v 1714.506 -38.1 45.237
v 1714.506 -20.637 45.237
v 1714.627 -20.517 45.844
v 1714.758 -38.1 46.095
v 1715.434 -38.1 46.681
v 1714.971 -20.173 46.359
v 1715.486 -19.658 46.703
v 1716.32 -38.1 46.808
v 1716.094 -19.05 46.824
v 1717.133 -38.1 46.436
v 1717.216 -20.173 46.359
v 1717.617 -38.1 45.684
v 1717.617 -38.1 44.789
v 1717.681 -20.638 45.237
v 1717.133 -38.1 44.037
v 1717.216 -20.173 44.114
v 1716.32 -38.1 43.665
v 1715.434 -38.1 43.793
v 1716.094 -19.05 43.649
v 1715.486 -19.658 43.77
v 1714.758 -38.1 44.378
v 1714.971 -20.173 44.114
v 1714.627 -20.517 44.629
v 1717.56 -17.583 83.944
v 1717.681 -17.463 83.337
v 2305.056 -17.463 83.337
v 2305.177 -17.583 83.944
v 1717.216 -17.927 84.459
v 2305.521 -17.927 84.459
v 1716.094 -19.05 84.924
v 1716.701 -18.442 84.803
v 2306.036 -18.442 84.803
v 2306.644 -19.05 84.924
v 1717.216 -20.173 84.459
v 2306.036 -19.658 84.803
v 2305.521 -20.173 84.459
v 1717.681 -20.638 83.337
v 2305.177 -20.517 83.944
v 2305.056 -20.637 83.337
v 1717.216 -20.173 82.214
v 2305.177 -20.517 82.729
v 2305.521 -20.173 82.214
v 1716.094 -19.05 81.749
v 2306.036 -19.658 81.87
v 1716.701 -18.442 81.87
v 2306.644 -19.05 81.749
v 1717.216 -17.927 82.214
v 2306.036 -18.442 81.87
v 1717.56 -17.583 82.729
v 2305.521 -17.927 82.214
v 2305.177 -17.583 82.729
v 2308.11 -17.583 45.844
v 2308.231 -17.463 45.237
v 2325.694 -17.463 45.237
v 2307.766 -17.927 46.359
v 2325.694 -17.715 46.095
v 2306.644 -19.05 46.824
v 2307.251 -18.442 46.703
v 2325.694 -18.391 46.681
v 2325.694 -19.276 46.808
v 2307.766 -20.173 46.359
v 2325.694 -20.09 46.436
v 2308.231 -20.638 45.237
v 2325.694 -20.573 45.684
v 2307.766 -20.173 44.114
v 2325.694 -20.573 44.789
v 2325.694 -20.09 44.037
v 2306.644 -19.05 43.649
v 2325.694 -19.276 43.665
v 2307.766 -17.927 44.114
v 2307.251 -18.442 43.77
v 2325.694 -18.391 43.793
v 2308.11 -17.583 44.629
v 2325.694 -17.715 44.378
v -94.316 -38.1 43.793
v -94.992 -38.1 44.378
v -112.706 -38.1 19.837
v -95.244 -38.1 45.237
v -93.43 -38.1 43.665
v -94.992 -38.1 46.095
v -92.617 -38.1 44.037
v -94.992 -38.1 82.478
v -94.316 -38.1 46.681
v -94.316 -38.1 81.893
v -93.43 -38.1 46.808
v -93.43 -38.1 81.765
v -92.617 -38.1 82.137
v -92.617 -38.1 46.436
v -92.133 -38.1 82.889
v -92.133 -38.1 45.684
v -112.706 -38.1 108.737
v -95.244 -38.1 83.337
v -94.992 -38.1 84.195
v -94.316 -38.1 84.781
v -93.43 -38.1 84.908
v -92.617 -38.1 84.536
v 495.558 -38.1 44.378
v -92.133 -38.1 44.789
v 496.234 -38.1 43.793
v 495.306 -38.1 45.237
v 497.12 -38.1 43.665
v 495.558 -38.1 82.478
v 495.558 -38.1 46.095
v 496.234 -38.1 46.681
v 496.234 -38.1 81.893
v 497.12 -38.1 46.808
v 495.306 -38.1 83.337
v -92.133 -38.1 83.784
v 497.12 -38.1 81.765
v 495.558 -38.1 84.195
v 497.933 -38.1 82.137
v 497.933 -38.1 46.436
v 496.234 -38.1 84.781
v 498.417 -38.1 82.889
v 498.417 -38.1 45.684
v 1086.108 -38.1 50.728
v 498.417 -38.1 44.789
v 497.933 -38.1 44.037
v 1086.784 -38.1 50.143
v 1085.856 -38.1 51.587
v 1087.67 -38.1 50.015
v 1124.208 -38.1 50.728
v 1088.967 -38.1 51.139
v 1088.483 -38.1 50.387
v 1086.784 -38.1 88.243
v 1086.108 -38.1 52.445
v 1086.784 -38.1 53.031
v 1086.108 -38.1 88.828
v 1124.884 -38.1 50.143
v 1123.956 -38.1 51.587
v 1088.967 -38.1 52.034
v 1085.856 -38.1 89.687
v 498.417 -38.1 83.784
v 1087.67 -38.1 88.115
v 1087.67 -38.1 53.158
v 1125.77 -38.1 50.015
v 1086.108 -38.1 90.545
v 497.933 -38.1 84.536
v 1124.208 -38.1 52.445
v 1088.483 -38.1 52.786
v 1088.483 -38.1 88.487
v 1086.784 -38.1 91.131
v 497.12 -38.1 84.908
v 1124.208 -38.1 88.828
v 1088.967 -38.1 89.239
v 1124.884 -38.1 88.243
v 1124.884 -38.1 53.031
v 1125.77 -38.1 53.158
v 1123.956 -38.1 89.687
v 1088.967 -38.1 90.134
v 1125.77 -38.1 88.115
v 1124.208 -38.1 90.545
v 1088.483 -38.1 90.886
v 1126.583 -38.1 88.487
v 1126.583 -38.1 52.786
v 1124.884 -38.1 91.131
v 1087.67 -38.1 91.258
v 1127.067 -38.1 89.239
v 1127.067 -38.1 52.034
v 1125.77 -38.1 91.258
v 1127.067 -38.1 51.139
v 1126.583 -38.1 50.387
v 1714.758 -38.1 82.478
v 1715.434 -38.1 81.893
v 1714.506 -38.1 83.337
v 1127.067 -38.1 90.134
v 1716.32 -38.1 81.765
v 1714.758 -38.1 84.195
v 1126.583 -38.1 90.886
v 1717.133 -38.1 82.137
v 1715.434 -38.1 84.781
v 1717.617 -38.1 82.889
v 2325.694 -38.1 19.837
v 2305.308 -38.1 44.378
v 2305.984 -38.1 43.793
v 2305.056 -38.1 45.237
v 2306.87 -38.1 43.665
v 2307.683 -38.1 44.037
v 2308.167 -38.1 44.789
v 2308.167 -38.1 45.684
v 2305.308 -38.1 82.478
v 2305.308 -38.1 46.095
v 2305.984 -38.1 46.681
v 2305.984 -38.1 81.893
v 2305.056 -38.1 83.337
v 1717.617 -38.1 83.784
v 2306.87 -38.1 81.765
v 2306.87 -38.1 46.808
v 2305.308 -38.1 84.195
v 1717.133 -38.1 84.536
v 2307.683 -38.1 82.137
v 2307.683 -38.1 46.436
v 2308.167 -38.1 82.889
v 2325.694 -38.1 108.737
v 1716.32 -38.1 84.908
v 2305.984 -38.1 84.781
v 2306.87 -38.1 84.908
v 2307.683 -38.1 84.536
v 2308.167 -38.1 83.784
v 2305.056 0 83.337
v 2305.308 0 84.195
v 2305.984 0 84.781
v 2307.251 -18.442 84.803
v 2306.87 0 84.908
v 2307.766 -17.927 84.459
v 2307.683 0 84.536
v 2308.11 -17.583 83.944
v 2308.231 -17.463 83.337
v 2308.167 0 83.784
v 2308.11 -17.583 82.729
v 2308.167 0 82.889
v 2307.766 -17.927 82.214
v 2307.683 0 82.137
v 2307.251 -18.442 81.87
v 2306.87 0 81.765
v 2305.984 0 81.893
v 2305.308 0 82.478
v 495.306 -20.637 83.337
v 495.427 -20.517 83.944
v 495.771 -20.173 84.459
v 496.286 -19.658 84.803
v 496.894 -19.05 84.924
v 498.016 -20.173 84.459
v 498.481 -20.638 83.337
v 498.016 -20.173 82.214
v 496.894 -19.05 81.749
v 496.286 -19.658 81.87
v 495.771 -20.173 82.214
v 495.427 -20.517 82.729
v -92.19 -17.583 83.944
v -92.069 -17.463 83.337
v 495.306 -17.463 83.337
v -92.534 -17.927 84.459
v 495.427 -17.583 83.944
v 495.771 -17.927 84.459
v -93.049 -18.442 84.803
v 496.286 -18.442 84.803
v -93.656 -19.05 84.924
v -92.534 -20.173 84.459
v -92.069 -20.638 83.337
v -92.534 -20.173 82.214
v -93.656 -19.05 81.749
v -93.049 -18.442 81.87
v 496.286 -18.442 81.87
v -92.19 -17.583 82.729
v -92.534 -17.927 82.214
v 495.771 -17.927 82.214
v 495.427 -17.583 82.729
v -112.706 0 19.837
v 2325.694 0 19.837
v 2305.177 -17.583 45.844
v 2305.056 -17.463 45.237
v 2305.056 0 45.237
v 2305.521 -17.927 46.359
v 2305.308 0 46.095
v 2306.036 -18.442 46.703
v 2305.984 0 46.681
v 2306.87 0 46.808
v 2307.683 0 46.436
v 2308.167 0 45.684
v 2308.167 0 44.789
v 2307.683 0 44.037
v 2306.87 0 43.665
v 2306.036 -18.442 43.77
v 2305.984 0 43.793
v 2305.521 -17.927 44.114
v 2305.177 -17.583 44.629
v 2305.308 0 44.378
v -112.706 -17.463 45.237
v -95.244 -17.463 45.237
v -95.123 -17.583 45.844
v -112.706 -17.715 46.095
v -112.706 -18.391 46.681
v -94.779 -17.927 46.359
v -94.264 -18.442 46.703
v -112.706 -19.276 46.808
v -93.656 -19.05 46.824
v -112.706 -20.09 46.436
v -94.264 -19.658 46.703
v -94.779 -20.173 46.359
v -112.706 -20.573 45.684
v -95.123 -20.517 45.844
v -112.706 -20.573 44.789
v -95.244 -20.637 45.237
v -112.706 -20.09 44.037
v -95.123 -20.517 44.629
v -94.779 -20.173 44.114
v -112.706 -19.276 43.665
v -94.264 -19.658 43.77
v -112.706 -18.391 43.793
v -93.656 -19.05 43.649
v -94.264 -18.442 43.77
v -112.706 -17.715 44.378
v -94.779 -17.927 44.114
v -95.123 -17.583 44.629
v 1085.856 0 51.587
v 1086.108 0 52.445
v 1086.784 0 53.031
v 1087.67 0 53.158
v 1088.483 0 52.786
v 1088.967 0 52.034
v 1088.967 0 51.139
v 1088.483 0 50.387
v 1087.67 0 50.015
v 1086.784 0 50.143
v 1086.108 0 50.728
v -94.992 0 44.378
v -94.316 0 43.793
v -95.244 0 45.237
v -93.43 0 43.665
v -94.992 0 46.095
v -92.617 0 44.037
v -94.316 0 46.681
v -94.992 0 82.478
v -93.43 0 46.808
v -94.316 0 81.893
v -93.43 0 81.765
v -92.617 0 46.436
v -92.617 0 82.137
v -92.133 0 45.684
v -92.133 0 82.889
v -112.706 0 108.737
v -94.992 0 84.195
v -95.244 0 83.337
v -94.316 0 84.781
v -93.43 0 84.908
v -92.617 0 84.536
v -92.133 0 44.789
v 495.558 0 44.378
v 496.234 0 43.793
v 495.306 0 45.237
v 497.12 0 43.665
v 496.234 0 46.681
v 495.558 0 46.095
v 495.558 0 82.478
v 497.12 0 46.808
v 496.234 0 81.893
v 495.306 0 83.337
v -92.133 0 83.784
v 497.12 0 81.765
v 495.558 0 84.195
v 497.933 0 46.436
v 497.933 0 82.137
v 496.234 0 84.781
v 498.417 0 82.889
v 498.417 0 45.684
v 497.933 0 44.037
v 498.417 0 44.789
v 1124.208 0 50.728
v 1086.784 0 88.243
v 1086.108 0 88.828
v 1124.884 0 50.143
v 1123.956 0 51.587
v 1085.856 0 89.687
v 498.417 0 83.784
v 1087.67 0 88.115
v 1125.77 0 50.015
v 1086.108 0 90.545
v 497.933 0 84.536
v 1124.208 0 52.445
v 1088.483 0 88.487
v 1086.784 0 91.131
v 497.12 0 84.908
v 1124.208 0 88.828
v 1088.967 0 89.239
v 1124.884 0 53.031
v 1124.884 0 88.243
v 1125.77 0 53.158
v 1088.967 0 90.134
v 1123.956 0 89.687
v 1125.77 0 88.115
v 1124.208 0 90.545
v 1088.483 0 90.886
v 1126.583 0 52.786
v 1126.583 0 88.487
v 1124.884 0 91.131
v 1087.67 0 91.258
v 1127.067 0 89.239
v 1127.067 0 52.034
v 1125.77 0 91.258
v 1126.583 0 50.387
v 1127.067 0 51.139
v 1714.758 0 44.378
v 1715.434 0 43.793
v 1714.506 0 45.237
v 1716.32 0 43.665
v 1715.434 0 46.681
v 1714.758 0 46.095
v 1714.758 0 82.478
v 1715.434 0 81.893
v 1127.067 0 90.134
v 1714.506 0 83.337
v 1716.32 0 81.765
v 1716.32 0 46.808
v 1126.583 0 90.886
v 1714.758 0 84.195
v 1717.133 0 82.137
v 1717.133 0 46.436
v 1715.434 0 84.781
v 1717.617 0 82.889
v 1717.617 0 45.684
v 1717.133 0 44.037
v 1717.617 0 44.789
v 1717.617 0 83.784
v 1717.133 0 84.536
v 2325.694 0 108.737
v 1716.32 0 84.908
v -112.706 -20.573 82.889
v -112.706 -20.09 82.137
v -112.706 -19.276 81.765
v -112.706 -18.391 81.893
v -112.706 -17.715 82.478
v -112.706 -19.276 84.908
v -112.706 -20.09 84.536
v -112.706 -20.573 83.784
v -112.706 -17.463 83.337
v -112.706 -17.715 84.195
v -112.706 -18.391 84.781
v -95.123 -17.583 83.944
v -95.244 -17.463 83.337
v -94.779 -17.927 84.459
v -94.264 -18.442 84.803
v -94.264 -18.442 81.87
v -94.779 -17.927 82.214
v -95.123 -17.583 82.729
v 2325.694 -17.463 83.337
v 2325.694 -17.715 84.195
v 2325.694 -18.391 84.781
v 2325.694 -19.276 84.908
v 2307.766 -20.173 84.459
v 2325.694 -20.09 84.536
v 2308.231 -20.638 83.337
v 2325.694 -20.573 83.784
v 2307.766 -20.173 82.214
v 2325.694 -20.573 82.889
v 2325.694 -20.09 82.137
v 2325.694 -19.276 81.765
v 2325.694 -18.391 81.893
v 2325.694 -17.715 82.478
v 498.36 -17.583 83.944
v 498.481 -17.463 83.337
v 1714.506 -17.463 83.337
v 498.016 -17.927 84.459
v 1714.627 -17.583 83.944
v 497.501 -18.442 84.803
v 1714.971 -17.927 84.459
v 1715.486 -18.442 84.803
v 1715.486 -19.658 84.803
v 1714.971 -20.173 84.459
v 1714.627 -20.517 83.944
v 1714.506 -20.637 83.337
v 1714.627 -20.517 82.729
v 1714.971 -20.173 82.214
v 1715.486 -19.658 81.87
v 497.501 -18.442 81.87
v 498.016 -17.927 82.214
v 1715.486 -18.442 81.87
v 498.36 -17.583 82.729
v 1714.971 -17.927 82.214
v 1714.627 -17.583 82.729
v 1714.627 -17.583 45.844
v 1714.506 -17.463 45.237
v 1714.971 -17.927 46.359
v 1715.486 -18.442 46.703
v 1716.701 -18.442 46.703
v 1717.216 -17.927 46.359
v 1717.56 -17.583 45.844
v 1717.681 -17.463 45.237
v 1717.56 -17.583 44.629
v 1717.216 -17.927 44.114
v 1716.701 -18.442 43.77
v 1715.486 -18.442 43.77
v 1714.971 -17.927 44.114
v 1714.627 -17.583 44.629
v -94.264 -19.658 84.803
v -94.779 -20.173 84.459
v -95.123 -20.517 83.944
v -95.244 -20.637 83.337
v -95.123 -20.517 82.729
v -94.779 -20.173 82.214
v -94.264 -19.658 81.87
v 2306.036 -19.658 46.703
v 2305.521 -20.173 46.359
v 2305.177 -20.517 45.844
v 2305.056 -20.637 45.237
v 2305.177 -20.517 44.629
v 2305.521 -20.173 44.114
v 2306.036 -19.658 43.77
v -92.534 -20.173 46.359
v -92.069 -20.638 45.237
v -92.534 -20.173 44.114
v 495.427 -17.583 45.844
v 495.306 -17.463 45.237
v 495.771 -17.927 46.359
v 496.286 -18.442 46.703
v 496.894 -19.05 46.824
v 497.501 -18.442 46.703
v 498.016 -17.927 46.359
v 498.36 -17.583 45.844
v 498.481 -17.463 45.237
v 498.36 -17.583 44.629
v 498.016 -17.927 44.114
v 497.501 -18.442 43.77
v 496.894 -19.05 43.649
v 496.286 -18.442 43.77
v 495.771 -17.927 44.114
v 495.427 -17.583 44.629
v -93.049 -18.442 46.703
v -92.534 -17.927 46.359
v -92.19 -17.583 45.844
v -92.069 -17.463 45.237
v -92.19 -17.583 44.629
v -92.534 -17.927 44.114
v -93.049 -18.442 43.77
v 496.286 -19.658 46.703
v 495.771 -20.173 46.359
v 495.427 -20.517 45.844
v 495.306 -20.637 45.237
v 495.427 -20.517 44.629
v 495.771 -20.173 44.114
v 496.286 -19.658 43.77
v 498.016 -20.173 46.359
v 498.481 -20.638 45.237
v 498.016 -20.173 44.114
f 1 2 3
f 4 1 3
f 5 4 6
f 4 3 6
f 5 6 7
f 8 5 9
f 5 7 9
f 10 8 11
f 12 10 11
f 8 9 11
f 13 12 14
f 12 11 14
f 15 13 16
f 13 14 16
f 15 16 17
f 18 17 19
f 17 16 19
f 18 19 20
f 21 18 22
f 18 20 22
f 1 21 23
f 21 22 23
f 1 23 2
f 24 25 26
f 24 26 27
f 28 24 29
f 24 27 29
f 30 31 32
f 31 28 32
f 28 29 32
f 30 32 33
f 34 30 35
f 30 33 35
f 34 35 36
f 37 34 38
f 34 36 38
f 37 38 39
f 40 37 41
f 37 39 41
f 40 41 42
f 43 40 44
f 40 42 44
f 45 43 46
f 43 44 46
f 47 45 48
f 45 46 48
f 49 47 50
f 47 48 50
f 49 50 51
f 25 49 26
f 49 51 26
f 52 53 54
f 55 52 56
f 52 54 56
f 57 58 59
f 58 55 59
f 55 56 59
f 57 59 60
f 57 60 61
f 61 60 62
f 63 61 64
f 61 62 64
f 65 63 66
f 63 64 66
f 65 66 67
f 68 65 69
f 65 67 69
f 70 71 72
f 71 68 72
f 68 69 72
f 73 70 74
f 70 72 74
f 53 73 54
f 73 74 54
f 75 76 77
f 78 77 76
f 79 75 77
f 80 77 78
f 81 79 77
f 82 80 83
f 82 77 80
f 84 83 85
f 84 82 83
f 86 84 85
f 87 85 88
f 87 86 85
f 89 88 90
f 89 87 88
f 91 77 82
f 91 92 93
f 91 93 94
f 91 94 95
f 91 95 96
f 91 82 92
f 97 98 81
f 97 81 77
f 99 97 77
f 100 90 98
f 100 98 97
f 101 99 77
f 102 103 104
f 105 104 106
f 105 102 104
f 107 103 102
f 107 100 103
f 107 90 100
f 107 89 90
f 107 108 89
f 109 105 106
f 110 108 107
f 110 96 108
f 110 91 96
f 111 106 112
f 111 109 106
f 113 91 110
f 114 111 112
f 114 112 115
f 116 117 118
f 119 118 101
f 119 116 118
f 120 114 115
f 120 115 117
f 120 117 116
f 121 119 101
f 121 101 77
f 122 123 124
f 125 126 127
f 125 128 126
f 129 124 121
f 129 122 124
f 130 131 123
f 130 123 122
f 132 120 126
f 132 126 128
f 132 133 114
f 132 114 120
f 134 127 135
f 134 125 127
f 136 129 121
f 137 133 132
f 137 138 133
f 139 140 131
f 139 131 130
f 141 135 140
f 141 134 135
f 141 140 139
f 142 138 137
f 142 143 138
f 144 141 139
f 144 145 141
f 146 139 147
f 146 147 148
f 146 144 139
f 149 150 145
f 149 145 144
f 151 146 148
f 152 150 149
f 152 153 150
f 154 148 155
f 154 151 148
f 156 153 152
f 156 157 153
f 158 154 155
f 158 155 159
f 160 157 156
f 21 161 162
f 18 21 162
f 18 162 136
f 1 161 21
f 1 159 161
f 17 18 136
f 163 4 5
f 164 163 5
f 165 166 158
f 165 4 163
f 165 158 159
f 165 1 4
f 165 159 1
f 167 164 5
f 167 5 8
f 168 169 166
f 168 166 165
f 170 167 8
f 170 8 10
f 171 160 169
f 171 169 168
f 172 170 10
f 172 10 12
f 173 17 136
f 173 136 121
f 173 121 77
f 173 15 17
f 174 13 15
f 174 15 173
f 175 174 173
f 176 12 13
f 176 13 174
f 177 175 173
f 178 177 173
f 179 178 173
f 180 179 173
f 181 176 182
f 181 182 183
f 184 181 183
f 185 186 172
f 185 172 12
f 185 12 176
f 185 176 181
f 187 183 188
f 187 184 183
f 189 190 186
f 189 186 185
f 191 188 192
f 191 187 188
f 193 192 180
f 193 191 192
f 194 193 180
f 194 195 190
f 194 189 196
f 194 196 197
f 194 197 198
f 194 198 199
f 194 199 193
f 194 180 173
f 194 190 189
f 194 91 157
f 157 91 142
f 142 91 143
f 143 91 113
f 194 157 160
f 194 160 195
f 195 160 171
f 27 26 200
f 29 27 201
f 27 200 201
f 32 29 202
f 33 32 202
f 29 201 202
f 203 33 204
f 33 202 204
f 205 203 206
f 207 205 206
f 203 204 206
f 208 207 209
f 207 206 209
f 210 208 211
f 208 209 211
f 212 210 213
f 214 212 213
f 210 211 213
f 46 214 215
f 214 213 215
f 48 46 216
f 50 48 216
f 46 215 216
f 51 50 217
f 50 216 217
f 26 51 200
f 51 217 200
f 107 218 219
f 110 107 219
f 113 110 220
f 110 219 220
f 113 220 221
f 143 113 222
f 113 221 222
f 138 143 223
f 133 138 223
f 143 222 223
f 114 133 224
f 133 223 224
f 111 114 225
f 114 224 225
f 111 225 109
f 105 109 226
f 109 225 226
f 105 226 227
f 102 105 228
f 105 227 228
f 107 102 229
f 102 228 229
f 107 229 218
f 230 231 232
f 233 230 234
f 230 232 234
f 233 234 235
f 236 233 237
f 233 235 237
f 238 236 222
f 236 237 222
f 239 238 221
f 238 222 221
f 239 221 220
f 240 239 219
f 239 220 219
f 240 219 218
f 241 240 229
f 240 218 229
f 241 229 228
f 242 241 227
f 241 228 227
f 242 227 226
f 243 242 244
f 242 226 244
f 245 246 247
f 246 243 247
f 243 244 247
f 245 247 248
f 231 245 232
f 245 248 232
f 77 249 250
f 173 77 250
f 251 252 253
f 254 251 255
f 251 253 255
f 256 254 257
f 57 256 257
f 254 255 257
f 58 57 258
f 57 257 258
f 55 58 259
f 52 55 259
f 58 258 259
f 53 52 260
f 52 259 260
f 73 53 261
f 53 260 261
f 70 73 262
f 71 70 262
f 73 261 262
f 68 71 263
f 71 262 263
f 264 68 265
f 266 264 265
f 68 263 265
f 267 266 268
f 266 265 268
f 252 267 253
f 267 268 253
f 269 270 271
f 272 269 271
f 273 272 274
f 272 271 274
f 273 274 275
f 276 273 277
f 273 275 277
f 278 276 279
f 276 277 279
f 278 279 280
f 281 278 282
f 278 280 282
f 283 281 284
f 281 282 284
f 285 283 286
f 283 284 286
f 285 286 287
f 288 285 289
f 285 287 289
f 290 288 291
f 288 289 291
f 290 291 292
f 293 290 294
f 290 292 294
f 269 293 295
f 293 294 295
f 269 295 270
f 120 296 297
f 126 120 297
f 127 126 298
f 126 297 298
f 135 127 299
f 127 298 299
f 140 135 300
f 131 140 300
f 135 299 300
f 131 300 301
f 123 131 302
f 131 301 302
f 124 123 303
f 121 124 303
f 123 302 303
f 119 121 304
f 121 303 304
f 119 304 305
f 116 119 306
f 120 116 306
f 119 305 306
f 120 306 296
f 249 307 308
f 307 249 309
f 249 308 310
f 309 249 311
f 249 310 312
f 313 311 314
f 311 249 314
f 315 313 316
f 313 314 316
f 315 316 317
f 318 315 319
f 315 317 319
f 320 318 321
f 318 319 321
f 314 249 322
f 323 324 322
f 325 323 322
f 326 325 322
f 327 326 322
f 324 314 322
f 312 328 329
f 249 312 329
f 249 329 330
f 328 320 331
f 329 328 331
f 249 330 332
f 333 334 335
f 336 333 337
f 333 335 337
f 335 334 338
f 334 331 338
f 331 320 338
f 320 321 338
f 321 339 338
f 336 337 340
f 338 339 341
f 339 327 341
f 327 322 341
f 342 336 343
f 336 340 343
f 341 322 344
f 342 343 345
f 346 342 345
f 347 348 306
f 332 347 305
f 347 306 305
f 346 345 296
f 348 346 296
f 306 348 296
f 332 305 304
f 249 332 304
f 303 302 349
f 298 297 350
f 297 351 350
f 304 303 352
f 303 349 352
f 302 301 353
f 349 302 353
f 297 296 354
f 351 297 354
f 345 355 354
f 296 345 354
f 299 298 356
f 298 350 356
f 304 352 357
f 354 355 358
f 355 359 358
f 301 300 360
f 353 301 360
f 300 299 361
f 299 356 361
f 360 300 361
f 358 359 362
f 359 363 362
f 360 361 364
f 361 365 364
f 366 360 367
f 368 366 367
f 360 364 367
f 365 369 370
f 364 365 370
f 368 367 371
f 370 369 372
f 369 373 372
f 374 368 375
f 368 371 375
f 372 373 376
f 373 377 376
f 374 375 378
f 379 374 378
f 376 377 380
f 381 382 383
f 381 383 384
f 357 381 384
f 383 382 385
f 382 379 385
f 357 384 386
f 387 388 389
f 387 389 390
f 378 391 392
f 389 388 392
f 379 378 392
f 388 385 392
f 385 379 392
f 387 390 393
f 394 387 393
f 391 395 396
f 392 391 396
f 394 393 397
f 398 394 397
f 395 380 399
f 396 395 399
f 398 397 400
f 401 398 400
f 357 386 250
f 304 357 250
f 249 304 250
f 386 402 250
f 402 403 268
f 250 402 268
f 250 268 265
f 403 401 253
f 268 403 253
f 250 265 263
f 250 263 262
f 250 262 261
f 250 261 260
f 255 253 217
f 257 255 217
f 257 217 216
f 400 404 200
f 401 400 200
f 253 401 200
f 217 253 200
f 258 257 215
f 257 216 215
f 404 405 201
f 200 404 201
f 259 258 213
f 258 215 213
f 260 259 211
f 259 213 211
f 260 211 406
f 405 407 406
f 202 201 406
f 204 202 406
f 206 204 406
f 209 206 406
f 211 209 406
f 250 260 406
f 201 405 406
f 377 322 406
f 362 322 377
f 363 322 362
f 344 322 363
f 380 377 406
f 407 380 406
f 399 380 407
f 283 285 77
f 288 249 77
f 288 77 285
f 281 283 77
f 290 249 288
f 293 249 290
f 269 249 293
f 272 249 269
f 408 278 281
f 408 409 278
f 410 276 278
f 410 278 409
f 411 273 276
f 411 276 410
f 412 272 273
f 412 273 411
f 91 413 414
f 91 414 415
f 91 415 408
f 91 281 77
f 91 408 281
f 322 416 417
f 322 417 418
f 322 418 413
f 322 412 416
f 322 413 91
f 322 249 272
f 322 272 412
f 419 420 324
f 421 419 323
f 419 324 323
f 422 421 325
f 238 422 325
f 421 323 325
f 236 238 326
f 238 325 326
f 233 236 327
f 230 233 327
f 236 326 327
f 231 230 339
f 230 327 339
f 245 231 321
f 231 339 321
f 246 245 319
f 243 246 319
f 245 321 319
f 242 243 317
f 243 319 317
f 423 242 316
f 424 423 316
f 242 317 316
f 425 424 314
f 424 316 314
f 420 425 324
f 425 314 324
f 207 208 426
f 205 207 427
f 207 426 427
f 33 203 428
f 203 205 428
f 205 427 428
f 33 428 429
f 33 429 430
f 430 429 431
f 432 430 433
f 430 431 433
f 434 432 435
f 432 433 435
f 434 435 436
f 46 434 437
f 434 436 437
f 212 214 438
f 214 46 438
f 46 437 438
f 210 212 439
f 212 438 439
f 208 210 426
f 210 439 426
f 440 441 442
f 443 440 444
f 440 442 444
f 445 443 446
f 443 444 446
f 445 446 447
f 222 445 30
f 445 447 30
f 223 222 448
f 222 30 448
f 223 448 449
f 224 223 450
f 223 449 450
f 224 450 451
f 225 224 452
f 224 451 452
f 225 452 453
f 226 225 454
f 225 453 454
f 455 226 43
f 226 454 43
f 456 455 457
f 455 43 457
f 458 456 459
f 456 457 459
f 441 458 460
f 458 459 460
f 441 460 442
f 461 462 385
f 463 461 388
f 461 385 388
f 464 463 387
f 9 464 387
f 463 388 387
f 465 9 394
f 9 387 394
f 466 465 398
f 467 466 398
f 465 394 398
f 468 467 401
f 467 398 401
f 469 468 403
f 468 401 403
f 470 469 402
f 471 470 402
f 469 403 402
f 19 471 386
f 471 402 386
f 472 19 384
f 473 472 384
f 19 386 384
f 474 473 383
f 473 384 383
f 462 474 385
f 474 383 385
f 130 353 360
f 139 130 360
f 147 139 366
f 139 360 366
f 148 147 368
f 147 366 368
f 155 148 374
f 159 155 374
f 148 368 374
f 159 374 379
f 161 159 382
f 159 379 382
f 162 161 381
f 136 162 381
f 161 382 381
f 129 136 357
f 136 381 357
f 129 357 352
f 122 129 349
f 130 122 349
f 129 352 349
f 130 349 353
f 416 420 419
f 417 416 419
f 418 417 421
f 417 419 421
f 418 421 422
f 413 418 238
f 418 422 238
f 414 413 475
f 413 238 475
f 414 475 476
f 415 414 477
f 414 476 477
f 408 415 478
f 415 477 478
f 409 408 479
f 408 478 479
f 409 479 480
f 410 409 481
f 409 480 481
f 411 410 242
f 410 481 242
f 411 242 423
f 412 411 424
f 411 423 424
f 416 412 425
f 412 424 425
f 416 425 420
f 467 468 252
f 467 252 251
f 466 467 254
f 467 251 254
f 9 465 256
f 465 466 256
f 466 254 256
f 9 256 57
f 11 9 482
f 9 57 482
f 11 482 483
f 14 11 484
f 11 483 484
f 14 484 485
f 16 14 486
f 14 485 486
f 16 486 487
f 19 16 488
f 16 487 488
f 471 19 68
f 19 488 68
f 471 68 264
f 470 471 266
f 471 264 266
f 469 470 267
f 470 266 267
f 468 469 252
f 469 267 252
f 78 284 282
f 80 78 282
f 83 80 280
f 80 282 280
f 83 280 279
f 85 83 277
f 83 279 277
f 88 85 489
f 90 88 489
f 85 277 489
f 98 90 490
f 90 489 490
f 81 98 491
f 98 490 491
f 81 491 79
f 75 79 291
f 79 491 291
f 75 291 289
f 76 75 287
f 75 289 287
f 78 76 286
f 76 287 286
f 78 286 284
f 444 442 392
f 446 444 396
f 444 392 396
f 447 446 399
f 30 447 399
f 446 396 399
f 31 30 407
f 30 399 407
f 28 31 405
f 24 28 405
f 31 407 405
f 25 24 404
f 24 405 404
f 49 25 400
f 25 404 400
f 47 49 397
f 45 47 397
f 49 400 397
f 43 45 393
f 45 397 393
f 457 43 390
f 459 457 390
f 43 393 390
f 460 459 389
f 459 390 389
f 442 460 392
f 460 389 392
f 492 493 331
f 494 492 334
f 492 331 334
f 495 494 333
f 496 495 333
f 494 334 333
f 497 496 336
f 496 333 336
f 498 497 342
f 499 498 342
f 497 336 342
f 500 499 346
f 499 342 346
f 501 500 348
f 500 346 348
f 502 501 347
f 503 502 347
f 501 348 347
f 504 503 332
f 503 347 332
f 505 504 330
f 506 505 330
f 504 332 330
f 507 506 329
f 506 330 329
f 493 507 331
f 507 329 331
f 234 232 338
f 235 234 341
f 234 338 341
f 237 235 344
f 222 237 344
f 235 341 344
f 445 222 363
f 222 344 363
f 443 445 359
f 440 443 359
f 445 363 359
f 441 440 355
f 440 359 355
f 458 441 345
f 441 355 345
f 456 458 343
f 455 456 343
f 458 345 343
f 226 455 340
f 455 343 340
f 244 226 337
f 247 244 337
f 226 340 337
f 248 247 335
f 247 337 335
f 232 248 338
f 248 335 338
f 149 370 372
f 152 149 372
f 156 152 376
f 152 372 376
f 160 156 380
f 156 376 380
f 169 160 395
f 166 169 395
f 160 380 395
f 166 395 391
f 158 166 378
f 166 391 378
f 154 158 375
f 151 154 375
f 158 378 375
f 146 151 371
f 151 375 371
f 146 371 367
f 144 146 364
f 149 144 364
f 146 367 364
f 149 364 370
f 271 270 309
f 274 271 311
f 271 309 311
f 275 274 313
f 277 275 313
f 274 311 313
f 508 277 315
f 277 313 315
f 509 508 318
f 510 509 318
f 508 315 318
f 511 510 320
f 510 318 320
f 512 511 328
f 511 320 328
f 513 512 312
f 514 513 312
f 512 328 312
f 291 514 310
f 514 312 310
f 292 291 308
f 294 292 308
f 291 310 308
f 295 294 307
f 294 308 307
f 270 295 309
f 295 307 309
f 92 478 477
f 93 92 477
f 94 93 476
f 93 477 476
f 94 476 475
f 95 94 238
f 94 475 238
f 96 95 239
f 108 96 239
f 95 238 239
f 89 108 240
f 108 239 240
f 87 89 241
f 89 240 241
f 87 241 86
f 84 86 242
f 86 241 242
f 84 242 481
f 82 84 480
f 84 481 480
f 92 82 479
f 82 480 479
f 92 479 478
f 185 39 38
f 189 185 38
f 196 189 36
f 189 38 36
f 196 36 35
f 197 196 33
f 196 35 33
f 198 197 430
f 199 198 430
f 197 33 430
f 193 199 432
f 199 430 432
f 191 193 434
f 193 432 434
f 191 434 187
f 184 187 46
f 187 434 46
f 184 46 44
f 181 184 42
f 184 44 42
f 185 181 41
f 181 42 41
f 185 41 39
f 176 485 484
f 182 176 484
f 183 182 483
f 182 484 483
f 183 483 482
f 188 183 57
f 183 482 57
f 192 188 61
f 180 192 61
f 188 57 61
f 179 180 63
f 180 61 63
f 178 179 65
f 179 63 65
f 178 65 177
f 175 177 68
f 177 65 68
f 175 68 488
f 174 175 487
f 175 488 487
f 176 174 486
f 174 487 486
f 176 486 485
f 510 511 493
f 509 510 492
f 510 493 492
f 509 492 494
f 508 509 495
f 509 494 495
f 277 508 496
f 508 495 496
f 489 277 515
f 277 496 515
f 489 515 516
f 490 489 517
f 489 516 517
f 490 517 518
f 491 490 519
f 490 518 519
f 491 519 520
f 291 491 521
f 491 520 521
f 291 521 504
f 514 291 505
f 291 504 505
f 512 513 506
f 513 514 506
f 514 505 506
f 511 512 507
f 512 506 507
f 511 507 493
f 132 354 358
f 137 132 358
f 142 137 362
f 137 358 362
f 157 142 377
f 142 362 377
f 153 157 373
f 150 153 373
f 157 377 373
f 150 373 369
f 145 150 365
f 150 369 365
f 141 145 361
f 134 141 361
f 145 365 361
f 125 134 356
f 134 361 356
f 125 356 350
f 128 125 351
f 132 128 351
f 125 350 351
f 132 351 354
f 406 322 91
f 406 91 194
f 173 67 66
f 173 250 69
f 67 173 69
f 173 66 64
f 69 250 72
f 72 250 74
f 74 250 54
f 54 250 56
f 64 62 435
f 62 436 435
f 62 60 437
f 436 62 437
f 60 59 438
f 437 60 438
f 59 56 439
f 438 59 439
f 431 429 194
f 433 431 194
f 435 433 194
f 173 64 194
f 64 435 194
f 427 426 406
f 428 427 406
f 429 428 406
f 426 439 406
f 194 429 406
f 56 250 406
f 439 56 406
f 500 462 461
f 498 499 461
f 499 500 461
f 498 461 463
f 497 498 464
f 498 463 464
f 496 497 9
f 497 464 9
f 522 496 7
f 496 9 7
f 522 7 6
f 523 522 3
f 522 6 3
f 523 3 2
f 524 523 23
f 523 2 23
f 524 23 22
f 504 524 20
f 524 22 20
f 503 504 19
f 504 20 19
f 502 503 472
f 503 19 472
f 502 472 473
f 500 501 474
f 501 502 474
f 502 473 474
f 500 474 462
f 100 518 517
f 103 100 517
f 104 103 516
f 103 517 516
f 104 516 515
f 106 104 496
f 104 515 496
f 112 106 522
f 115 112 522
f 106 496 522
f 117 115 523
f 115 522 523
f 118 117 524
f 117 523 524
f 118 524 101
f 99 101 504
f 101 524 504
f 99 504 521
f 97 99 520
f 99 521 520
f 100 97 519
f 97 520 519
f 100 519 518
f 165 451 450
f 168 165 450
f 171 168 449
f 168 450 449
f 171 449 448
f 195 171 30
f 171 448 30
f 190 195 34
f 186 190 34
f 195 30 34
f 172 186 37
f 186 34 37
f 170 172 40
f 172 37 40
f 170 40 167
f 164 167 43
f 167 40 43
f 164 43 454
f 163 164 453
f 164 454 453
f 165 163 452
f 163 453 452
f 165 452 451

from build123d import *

# Parameters (mm, degrees)
F0_W     = 2438.4
F0_H     = 88.9
F1_DEPTH = 38.1
F3_D     = 3.175
F5_D     = 3.175


with BuildPart() as f1:
    # F0 (on Front) → F1 (new body)
    with BuildSketch(Plane.XZ):
        with Locations((1106.49364, 64.286581)):
            Rectangle(F0_W, F0_H)
    extrude(amount=F1_DEPTH)

    # F3 (through all)
    with Locations(Plane.XZ.offset(38.1)):
        with Locations((-93.65636, 83.336581), (-93.65636, 45.236581), (496.89364, 83.336581), (496.89364, 45.236581), (1087.44364, 89.686581), (1125.54364, 89.686581), (1087.44364, 51.586581), (1125.54364, 51.586581), (1716.09364, 83.336581), (1716.09364, 45.236581), (2306.64364, 83.336581), (2306.64364, 45.236581)):
            Hole(F3_D / 2)

    # F5 (through all)
    with Locations(Plane(origin=(-112.70636, 0, 0), x_dir=(0, -1, 0), z_dir=(-1, 0, 0))):
        with Locations((19.05, 83.336581), (19.05, 45.236581)):
            Hole(F5_D / 2)


solid = f1.part
